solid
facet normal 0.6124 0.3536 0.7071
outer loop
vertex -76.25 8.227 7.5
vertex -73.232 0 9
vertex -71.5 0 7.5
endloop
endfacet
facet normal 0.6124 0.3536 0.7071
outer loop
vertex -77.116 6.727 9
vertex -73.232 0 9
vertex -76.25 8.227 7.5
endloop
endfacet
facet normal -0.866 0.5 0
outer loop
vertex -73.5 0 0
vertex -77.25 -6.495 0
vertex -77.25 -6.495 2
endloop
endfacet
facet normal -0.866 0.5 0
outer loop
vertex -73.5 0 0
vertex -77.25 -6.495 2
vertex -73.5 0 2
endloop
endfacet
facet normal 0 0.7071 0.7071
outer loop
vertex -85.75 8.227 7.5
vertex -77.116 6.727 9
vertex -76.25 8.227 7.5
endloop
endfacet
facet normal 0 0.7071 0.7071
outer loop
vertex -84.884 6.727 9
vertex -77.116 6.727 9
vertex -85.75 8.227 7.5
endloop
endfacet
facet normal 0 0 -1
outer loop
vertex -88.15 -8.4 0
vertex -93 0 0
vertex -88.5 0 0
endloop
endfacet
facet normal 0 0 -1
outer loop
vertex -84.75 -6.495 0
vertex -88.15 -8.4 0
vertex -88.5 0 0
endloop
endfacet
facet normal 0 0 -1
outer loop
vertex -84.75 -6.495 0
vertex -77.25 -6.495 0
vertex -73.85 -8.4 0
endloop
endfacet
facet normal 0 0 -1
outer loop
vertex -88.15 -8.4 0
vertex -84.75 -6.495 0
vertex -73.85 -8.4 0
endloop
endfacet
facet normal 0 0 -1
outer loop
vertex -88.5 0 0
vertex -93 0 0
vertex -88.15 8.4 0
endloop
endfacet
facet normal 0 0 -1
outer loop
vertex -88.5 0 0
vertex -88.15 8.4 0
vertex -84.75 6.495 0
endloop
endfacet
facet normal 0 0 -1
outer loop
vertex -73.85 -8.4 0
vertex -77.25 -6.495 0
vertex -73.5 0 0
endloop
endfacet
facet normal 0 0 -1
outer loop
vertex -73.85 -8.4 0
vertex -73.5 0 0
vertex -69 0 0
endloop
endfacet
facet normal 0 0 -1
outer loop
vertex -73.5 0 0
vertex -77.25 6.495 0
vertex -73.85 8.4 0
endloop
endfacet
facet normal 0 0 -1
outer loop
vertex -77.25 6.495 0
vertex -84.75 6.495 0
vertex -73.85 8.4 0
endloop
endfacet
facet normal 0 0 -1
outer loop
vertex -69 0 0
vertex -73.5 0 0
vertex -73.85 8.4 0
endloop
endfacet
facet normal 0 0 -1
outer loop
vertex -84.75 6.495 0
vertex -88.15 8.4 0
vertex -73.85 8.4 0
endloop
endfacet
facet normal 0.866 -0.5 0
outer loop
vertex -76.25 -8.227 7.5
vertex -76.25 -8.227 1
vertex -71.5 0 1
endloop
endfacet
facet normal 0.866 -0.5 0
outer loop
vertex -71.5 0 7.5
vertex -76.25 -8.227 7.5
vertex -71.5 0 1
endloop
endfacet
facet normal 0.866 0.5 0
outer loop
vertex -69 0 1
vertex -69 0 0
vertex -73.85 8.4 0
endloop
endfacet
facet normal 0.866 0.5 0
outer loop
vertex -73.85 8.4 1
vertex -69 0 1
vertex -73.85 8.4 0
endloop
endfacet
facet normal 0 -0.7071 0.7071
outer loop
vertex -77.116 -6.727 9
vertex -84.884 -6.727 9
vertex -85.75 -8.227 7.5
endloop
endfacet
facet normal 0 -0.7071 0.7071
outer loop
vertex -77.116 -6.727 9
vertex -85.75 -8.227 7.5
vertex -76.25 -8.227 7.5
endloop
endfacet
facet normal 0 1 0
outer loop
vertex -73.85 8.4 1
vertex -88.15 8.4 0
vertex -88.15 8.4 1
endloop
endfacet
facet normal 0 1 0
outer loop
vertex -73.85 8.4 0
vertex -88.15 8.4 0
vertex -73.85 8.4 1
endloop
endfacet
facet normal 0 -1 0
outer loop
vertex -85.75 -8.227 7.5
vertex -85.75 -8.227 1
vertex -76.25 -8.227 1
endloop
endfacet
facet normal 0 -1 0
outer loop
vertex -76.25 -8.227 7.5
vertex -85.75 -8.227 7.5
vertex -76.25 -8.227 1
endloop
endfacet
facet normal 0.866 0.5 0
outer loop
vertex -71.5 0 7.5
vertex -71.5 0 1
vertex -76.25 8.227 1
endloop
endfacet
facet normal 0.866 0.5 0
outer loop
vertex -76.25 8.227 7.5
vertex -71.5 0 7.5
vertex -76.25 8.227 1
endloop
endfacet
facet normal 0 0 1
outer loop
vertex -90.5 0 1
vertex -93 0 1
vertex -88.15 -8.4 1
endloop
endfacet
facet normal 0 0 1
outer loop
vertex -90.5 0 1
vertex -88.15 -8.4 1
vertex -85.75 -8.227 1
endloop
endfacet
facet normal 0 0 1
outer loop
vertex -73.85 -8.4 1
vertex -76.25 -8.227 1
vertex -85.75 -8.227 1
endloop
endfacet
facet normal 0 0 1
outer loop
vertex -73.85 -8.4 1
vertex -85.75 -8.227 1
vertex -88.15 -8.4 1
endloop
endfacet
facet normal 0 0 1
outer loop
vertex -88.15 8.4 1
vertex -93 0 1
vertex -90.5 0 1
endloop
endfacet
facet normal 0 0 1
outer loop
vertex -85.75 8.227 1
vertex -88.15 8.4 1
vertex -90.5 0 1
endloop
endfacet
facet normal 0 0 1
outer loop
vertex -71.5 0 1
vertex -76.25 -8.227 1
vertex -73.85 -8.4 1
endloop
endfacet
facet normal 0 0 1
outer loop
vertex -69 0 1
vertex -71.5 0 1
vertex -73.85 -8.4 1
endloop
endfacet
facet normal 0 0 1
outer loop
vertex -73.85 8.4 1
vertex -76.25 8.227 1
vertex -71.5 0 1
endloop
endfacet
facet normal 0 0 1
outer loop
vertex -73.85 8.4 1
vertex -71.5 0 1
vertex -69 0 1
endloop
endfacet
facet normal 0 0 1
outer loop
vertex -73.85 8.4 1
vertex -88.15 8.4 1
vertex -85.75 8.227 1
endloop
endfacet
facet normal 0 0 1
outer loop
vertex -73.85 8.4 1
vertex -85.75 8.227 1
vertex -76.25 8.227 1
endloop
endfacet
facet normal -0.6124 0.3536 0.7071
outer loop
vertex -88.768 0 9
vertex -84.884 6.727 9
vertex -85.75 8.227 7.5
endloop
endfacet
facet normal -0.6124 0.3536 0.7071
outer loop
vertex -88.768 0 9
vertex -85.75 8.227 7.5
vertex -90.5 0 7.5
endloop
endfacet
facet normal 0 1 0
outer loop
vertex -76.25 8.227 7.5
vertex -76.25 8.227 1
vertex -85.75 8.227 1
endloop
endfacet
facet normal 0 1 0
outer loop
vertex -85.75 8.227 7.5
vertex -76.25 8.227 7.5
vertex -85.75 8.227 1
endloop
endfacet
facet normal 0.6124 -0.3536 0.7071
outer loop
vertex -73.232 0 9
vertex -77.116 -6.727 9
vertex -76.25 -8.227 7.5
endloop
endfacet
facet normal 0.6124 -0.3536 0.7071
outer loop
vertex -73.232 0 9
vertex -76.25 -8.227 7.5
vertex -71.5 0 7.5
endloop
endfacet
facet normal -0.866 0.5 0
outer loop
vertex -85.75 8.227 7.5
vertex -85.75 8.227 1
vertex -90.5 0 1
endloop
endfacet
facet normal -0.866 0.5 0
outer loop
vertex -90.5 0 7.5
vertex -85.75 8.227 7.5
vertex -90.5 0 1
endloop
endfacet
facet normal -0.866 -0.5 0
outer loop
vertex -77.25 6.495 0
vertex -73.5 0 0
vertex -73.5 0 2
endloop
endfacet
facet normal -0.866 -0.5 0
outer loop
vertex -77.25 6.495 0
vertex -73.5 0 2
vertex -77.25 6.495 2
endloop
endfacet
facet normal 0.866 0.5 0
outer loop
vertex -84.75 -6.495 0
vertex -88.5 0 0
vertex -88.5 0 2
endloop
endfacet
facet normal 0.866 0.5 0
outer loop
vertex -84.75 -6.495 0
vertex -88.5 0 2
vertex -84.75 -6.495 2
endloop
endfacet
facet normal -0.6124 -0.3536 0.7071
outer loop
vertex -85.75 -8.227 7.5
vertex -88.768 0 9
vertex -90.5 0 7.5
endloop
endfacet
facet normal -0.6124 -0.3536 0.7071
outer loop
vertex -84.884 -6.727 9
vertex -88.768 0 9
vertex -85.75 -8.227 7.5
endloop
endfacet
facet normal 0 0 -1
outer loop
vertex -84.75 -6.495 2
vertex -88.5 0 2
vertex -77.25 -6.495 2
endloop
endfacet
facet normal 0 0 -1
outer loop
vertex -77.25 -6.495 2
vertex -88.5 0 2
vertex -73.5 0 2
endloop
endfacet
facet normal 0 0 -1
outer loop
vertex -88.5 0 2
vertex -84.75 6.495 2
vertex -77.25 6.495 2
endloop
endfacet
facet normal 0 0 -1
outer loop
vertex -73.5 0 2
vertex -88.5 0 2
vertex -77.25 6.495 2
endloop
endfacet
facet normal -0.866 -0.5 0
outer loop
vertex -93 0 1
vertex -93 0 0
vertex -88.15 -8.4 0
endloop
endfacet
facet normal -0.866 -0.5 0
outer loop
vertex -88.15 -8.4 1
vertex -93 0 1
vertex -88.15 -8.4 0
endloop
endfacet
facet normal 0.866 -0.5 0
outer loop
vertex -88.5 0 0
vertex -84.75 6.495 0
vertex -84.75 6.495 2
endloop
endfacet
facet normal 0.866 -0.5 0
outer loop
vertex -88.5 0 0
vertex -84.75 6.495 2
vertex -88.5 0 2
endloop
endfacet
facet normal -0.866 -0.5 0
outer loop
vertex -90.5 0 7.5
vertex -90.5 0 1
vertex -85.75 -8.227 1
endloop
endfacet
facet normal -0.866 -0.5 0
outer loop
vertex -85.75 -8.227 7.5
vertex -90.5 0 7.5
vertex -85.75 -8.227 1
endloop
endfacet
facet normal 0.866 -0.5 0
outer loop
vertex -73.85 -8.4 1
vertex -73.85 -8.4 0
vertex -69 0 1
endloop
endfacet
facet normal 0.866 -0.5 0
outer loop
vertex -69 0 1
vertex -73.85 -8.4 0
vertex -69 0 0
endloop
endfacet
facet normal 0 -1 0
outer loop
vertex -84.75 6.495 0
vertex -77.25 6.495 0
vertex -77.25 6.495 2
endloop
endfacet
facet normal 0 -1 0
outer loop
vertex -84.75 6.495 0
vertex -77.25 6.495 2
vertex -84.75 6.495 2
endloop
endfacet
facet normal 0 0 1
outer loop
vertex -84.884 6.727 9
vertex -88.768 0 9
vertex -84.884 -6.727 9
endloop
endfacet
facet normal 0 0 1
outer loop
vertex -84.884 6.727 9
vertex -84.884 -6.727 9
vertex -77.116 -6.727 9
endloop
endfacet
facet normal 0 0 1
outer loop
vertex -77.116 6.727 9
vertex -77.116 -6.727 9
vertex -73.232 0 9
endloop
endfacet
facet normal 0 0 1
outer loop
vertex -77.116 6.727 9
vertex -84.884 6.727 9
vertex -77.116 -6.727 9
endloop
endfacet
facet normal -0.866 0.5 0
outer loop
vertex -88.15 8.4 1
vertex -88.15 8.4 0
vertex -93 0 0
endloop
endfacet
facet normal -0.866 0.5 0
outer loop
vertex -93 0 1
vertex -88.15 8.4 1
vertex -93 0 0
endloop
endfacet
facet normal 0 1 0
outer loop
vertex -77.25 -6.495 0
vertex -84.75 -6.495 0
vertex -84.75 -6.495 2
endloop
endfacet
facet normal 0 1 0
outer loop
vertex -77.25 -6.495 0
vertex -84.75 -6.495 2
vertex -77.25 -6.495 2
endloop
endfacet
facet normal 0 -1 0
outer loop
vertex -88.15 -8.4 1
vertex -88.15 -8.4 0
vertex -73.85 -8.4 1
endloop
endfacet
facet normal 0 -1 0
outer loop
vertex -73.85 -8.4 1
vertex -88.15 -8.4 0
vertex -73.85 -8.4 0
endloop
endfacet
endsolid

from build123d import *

# Parameters (mm, degrees)
BOX036_W        = 26
BOX036_H        = 10
BOX036_DEPTH    = 10
BOX035_W        = 26
BOX035_H        = 10
BOX035_DEPTH    = 10
PRISM011_DEPTH  = 2
PRISM010_DEPTH  = 1
PRISM009_DEPTH  = 9
CHAMFER006_SIZE = 1.5


with BuildPart() as cubo032:
    # Box036 → Box036 (new body)
    with BuildSketch(Plane(origin=(-95, -18.4, 0), x_dir=(1, 0, 0), z_dir=(0, 0, 1))):
        with Locations((13, 5)):
            Rectangle(BOX036_W, BOX036_H)
    extrude(amount=BOX036_DEPTH)


with BuildPart() as fusion016:
    # Box035 → Box035 (new body)
    with BuildSketch(Plane(origin=(-95, 8.4, 0), x_dir=(1, 0, 0), z_dir=(0, 0, 1))):
        with Locations((13, 5)):
            Rectangle(BOX035_W, BOX035_H)
    extrude(amount=BOX035_DEPTH)

    # Fusion016: union Cubo032
    add(cubo032.part)


with BuildPart() as prisma008:
    # Prism011 → Prism011 (new body)
    with BuildSketch(Plane.XY):
        Polygon((7.5, 0), (3.75, 6.495191), (-3.75, 6.495191), (-7.5, 0), (-3.75, -6.495191), (3.75, -6.495191), align=None)
    extrude(amount=PRISM011_DEPTH)


with BuildPart() as prisma007:
    # Prism010 → Prism010 (new body)
    with BuildSketch(Plane.XY):
        Polygon((12, 0), (6, 10.392305), (-6, 10.392305), (-12, 0), (-6, -10.392305), (6, -10.392305), align=None)
    extrude(amount=PRISM010_DEPTH)


with BuildPart() as chamfer006:
    # Prism009 → Prism009 (new body)
    with BuildSketch(Plane.XY):
        Polygon((9.5, 0), (4.75, 8.227241), (-4.75, 8.227241), (-9.5, 0), (-4.75, -8.227241), (4.75, -8.227241), align=None)
    extrude(amount=PRISM009_DEPTH)

    # Fusion015: union Prisma007
    add(prisma007.part)

    # Cut018: cut Prisma008
    add(prisma008.part, mode=Mode.SUBTRACT)


with BuildPart() as chamfer006_1:
    # Cut018 placement: moved
    add(chamfer006.part.moved(Location((-81, 0, 0))))

    # Cut019: cut Fusion016
    add(fusion016.part, mode=Mode.SUBTRACT)

    # Chamfer006
    chamfer006_edges = [chamfer006_1.edges().sort_by_distance(p)[0] for p in [
        (-73.875, 4.113621, 9),
        (-73.875, -4.113621, 9),
        (-81, 8.227241, 9),
        (-81, -8.227241, 9),
        (-88.125, 4.113621, 9),
        (-88.125, -4.113621, 9),
    ]]
    chamfer(chamfer006_edges, length=CHAMFER006_SIZE)


solid = chamfer006_1.part
